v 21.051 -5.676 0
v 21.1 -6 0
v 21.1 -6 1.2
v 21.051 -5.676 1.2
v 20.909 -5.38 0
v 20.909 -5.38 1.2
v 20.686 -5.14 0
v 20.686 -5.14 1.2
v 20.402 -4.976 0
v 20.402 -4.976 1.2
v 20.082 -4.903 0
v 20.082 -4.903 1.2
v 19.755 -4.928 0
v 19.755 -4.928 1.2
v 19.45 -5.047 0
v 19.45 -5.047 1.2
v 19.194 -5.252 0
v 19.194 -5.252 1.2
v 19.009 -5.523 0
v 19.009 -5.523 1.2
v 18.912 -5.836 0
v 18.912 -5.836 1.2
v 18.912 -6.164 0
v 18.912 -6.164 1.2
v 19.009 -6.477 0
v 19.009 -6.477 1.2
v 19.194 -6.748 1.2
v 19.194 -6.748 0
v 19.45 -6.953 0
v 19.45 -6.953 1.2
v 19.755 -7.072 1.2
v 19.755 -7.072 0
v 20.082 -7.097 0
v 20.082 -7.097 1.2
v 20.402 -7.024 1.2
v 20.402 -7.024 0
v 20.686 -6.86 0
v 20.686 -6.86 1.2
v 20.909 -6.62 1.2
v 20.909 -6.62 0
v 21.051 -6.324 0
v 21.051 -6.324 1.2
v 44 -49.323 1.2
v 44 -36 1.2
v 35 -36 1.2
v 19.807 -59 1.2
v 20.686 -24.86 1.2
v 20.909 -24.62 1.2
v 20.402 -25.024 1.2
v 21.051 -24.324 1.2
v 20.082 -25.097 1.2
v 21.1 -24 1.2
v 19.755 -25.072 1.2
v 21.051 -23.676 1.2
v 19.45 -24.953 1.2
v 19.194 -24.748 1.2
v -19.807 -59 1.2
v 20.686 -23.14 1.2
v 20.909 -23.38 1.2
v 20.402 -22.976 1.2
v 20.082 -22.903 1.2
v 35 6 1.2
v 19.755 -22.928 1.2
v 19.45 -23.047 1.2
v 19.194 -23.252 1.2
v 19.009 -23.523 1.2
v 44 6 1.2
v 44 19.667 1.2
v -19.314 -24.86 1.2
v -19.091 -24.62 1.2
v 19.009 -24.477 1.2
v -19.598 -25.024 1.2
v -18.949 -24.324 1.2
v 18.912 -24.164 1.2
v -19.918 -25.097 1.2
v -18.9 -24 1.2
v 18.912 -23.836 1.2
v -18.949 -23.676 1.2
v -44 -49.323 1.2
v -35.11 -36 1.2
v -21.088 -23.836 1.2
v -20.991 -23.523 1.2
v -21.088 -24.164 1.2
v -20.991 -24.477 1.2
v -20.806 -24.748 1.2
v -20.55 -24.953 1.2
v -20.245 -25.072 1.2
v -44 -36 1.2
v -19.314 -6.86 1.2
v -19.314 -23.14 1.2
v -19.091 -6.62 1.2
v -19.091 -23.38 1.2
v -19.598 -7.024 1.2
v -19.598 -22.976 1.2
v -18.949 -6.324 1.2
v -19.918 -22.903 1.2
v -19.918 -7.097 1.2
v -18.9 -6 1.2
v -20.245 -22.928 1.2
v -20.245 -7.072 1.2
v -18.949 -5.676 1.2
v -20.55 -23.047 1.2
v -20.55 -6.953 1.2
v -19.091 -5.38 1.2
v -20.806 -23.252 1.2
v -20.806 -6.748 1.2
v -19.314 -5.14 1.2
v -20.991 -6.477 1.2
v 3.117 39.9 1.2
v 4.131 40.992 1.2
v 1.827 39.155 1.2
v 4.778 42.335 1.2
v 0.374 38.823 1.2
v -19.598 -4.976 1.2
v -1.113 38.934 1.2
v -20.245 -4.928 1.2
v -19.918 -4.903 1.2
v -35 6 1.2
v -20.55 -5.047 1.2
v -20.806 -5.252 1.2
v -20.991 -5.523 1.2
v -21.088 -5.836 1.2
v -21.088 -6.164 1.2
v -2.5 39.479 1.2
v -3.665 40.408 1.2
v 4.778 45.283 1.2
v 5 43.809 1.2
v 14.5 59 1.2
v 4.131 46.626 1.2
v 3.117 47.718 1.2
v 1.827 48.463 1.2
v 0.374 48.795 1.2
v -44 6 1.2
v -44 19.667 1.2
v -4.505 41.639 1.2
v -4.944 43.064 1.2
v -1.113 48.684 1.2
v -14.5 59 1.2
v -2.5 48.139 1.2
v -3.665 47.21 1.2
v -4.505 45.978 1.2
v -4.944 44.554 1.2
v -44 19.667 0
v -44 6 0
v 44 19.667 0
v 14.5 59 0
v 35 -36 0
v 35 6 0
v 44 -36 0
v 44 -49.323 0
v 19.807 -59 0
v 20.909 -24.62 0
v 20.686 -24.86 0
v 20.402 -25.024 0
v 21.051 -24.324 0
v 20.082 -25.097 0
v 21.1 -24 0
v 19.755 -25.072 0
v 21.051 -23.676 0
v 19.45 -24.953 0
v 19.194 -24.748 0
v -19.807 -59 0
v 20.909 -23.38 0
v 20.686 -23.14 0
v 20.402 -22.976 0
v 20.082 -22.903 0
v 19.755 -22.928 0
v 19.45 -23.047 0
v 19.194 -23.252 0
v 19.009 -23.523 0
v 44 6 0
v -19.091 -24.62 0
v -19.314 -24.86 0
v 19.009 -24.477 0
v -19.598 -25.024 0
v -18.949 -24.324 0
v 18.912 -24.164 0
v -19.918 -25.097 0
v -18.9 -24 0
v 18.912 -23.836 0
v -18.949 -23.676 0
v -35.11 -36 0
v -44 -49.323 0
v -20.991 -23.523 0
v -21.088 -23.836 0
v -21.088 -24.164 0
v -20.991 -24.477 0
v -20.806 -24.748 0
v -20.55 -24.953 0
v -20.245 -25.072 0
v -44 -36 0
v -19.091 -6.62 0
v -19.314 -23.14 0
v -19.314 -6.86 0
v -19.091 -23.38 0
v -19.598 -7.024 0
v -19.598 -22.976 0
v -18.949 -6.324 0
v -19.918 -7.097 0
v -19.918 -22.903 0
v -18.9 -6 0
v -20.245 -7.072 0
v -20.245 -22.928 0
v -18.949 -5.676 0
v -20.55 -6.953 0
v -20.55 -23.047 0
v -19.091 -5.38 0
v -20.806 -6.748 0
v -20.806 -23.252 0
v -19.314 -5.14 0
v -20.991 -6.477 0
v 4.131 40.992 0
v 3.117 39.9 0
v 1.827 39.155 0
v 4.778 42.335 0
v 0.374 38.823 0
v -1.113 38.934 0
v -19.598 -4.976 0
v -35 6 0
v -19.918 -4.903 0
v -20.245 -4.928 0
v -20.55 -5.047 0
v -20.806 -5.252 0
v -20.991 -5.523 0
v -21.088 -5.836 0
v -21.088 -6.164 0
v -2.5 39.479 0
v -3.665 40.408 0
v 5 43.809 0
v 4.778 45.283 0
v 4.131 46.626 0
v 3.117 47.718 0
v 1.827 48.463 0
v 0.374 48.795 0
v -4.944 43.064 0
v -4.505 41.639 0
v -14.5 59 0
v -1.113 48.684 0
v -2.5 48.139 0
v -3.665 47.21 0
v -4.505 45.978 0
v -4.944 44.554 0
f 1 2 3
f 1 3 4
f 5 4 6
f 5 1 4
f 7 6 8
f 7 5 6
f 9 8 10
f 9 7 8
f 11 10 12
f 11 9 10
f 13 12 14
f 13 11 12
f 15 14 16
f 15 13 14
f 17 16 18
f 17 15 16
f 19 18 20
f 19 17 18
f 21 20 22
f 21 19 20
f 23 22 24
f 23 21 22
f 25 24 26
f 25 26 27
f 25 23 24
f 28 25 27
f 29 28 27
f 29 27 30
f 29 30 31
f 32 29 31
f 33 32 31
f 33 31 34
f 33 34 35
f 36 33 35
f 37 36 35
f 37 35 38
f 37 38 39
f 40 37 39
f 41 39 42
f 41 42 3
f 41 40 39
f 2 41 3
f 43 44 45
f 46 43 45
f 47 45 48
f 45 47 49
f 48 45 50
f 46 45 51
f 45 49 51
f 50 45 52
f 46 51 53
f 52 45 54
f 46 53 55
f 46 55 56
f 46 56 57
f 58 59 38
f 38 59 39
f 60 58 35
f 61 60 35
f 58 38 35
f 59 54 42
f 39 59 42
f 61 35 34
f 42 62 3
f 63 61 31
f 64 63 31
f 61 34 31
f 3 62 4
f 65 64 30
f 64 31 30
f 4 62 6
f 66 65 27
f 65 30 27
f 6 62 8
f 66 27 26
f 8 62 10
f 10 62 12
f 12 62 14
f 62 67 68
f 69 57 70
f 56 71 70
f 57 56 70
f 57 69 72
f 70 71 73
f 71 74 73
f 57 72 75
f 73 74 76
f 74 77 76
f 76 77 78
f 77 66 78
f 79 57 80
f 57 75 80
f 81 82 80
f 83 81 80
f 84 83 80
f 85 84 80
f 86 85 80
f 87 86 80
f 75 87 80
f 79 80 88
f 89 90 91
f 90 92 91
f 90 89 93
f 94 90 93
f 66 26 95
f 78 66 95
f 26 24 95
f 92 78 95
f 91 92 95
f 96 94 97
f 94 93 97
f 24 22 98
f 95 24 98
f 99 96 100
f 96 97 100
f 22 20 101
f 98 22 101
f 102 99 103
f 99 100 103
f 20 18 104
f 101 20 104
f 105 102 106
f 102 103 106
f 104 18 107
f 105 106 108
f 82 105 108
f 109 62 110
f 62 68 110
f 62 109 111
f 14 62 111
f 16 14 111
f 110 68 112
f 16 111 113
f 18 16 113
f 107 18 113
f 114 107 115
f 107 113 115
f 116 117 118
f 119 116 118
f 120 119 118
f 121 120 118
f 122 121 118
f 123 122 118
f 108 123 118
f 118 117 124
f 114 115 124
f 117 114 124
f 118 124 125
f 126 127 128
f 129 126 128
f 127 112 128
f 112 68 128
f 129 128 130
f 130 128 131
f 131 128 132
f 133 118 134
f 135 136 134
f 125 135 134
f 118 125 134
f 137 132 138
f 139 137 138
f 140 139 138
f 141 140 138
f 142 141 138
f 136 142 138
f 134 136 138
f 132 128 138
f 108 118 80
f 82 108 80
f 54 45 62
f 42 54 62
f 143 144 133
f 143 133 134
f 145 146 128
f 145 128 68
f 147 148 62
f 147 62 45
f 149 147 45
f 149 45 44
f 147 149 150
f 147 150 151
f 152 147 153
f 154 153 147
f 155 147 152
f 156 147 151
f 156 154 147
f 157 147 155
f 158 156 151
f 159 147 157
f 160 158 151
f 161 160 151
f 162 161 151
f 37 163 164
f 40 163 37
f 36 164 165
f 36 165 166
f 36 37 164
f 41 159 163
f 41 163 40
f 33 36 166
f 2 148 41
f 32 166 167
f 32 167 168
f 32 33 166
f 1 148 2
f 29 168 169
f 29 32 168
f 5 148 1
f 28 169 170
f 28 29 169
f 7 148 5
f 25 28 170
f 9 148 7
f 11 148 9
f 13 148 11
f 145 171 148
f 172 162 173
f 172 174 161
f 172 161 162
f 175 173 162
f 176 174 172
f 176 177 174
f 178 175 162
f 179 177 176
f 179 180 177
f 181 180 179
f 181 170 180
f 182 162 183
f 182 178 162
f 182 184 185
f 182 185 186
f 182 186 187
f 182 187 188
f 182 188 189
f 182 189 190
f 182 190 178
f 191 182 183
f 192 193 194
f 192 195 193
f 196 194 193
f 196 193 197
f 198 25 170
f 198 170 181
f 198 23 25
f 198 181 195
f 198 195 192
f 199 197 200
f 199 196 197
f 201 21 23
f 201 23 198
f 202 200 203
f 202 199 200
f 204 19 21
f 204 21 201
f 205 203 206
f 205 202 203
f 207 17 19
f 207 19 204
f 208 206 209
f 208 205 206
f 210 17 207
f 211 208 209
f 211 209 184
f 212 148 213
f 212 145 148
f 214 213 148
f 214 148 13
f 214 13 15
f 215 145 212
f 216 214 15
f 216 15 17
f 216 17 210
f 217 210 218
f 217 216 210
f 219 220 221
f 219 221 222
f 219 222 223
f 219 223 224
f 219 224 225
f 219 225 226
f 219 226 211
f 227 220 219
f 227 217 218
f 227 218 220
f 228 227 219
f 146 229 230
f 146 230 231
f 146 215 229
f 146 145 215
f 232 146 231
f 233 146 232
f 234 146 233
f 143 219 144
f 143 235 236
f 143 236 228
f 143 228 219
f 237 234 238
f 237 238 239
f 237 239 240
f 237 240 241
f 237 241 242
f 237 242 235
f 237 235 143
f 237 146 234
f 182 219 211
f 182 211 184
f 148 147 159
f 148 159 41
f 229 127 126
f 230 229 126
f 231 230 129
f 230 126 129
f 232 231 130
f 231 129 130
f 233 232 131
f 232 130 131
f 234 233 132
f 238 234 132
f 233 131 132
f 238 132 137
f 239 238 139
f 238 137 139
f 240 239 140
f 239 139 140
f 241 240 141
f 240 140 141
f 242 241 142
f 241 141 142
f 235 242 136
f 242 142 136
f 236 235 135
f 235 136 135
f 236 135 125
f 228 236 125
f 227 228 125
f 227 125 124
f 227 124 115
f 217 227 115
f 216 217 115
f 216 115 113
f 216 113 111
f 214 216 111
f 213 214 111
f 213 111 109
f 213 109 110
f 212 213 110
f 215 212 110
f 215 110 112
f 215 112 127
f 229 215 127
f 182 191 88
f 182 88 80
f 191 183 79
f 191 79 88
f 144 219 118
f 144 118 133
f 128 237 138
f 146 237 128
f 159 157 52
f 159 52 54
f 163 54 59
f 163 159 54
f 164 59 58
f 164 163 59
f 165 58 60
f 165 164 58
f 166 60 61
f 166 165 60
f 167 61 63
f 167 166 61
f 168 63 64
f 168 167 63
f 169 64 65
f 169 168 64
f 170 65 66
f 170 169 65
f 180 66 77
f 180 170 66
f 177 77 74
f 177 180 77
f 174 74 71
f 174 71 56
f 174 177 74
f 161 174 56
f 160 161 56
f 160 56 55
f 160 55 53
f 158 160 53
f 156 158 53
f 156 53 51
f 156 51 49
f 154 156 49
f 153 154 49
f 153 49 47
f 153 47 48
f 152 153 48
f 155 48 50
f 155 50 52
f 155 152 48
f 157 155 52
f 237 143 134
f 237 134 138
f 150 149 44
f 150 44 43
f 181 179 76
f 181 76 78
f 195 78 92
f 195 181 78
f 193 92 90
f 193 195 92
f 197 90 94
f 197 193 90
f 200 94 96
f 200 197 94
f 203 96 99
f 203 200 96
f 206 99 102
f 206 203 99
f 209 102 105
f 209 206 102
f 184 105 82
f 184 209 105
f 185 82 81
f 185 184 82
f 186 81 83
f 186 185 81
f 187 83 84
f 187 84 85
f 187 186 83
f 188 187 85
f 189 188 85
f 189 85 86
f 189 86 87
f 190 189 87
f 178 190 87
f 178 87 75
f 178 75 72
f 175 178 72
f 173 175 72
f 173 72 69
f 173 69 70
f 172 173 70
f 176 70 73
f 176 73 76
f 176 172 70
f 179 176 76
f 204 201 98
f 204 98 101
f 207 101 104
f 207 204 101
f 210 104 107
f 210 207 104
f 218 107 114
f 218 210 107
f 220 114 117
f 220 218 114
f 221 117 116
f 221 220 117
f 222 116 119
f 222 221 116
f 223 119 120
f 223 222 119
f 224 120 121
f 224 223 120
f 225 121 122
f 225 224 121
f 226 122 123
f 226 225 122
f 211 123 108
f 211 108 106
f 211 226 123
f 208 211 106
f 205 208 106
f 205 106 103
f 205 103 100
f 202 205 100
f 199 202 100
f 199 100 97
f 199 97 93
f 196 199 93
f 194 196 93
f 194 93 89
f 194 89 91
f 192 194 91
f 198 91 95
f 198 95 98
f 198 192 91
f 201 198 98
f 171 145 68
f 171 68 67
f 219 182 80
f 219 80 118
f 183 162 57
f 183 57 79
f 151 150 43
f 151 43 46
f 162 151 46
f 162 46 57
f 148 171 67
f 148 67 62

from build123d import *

# Parameters (mm, degrees)
SKETCH1_R           = 1.1
BOSS_EXTRUDE1_DEPTH = 1.2
SKETCH2_R           = 5
CUT_EXTRUDE1_DEPTH  = 74.610053661


with BuildPart() as part:
    # Sketch1 → Boss-Extrude1 (new body)
    with BuildSketch(Plane.XY):
        Polygon((-19.807417596, -59), (-44, -49.322967039), (-44, -36), (-35.109892996, -36), (-35, 6), (-44, 6), (-44, 19.666666667), (-14.5, 59), (14.5, 59), (44, 19.666666667), (44, 6), (35, 6), (35, -36), (44, -36), (44, -49.322967039), (19.807417596, -59), align=None)
        with Locations((-20, -6)):
            Circle(SKETCH1_R, mode=Mode.SUBTRACT)
        with Locations((-20, -24)):
            Circle(SKETCH1_R, mode=Mode.SUBTRACT)
        with Locations((20, -6)):
            Circle(SKETCH1_R, mode=Mode.SUBTRACT)
        with Locations((20, -24)):
            Circle(SKETCH1_R, mode=Mode.SUBTRACT)
    extrude(amount=BOSS_EXTRUDE1_DEPTH)

    # Sketch2 → Cut-Extrude1 (cut, through all)
    with BuildSketch(Plane.XY.offset(1.2)):
        with Locations((0, 43.808911543)):
            Circle(SKETCH2_R)
    extrude(amount=-CUT_EXTRUDE1_DEPTH, mode=Mode.SUBTRACT)


solid = part.part
